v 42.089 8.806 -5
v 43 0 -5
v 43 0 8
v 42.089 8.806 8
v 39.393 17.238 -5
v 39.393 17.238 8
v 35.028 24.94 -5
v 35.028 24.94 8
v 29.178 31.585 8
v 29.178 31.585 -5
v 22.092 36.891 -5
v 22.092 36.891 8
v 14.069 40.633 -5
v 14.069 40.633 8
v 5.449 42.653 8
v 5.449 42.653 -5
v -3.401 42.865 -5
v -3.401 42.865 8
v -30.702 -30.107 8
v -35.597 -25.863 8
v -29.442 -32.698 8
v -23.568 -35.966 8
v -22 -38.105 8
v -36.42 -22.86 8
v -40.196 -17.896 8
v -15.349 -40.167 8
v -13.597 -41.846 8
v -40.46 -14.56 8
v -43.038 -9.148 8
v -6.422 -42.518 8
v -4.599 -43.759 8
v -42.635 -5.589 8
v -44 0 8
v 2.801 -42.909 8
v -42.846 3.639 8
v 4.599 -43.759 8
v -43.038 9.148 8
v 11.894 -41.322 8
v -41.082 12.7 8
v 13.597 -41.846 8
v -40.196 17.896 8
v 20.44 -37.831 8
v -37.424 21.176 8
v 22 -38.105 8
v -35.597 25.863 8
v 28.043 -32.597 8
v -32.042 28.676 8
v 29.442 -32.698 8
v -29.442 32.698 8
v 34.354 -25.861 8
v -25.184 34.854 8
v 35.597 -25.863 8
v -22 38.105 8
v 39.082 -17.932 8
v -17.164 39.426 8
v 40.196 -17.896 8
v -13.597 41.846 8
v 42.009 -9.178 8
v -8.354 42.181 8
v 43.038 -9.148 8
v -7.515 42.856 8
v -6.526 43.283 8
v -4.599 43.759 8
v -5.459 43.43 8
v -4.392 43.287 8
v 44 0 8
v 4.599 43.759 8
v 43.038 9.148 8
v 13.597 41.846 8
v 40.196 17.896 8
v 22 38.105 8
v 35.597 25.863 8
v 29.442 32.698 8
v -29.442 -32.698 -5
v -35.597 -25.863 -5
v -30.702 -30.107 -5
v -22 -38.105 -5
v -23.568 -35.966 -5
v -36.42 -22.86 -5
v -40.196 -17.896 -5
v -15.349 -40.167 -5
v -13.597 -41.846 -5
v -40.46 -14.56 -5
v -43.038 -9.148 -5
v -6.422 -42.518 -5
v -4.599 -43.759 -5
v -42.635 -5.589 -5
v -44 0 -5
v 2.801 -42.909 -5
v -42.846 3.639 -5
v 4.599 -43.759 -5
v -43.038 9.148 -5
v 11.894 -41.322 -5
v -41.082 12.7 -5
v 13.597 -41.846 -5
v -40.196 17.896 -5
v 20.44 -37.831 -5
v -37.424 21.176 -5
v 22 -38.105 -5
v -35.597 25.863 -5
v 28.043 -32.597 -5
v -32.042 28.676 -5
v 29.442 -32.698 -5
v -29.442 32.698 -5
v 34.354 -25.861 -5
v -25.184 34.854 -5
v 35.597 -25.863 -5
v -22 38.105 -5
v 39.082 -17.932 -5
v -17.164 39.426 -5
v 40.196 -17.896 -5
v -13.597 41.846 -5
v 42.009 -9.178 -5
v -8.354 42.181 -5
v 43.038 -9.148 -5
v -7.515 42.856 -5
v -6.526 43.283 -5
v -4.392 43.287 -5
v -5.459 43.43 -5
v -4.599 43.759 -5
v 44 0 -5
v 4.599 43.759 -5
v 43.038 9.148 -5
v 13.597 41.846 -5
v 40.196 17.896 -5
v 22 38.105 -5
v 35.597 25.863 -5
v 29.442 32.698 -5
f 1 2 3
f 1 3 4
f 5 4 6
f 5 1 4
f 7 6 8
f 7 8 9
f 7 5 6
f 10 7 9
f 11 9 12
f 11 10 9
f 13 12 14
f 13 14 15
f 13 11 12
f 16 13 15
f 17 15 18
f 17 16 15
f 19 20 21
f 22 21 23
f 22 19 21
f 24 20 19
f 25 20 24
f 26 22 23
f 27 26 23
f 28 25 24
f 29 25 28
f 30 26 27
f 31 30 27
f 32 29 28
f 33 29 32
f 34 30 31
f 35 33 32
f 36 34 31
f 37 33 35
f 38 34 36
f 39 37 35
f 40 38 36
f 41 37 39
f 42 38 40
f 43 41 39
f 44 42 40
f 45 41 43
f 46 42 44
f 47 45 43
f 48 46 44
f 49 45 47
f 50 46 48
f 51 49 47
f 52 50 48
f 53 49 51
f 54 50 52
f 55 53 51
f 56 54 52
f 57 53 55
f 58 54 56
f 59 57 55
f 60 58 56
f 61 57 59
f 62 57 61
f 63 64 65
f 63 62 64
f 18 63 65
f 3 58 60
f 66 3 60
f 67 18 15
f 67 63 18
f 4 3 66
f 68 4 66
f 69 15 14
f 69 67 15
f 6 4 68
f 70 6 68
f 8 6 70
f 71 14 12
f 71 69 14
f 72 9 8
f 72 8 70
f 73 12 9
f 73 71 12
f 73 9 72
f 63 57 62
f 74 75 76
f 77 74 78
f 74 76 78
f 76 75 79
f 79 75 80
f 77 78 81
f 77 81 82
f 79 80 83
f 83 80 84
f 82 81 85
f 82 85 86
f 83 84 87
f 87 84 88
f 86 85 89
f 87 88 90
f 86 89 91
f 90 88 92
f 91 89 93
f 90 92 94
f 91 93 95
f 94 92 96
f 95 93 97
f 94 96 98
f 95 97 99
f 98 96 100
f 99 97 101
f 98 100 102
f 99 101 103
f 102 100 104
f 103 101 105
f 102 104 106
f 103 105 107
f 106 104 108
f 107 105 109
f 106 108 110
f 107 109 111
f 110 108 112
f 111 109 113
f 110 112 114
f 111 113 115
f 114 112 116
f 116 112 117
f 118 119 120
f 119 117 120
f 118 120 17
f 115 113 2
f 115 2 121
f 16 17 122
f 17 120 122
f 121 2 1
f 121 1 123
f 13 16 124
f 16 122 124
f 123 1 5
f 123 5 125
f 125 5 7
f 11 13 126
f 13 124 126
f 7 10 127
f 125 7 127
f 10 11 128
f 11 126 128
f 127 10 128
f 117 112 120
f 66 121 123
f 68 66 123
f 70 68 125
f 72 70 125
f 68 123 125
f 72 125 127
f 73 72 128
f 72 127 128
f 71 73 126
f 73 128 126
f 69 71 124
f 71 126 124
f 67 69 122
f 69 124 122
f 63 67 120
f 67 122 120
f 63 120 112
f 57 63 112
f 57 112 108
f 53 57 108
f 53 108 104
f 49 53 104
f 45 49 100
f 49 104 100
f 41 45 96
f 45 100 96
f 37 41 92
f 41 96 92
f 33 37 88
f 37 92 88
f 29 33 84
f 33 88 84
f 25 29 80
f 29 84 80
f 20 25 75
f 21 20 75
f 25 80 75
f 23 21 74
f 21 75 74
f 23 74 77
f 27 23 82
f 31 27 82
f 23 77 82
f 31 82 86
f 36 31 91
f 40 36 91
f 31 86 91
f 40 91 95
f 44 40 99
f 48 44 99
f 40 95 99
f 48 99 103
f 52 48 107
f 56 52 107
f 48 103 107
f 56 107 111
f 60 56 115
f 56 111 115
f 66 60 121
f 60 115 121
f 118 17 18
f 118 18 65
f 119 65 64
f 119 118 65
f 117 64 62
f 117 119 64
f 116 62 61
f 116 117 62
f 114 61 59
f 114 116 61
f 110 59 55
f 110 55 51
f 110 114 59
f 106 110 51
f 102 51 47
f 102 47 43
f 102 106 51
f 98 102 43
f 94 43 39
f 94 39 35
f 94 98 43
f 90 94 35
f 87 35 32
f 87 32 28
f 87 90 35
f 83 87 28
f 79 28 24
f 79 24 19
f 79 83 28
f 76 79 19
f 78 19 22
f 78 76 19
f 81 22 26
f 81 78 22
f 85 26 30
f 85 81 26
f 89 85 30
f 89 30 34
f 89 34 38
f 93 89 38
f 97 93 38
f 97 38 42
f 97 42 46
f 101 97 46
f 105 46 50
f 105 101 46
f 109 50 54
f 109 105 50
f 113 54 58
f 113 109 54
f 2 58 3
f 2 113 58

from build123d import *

# Parameters (mm, degrees)
SKETCH006_R       = 4
EXTRUDE008_DEPTH  = 13
CYLINDER003_R     = 43
CYLINDER003_DEPTH = 13
CYLINDER002_R     = 44
CYLINDER002_DEPTH = 13


with BuildPart() as extrude008:
    # Sketch006 → Extrude008 (new body)
    with BuildSketch(Plane.XY):
        with Locations((-5.45, 39.43)):
            Circle(SKETCH006_R)
    extrude(amount=EXTRUDE008_DEPTH)


with BuildPart() as extrude008_1:
    # Extrude008 placement: moved
    add(extrude008.part.moved(Location((0, 0, -5))))


with BuildPart() as overlap_cutout:
    # Cylinder003 → Cylinder003 (new body)
    with BuildSketch(Plane.XY.offset(-5)):
        Circle(CYLINDER003_R)
    extrude(amount=CYLINDER003_DEPTH)

    # Fusion: union Extrude008
    add(extrude008_1.part)


with BuildPart() as overlap_with_cutout:
    # Cylinder002 → Cylinder002 (new body)
    with BuildSketch(Plane.XY.offset(-5)):
        Circle(CYLINDER002_R)
    extrude(amount=CYLINDER002_DEPTH)

    # Cut006: cut overlap-cutout
    add(overlap_cutout.part, mode=Mode.SUBTRACT)


solid = overlap_with_cutout.part
